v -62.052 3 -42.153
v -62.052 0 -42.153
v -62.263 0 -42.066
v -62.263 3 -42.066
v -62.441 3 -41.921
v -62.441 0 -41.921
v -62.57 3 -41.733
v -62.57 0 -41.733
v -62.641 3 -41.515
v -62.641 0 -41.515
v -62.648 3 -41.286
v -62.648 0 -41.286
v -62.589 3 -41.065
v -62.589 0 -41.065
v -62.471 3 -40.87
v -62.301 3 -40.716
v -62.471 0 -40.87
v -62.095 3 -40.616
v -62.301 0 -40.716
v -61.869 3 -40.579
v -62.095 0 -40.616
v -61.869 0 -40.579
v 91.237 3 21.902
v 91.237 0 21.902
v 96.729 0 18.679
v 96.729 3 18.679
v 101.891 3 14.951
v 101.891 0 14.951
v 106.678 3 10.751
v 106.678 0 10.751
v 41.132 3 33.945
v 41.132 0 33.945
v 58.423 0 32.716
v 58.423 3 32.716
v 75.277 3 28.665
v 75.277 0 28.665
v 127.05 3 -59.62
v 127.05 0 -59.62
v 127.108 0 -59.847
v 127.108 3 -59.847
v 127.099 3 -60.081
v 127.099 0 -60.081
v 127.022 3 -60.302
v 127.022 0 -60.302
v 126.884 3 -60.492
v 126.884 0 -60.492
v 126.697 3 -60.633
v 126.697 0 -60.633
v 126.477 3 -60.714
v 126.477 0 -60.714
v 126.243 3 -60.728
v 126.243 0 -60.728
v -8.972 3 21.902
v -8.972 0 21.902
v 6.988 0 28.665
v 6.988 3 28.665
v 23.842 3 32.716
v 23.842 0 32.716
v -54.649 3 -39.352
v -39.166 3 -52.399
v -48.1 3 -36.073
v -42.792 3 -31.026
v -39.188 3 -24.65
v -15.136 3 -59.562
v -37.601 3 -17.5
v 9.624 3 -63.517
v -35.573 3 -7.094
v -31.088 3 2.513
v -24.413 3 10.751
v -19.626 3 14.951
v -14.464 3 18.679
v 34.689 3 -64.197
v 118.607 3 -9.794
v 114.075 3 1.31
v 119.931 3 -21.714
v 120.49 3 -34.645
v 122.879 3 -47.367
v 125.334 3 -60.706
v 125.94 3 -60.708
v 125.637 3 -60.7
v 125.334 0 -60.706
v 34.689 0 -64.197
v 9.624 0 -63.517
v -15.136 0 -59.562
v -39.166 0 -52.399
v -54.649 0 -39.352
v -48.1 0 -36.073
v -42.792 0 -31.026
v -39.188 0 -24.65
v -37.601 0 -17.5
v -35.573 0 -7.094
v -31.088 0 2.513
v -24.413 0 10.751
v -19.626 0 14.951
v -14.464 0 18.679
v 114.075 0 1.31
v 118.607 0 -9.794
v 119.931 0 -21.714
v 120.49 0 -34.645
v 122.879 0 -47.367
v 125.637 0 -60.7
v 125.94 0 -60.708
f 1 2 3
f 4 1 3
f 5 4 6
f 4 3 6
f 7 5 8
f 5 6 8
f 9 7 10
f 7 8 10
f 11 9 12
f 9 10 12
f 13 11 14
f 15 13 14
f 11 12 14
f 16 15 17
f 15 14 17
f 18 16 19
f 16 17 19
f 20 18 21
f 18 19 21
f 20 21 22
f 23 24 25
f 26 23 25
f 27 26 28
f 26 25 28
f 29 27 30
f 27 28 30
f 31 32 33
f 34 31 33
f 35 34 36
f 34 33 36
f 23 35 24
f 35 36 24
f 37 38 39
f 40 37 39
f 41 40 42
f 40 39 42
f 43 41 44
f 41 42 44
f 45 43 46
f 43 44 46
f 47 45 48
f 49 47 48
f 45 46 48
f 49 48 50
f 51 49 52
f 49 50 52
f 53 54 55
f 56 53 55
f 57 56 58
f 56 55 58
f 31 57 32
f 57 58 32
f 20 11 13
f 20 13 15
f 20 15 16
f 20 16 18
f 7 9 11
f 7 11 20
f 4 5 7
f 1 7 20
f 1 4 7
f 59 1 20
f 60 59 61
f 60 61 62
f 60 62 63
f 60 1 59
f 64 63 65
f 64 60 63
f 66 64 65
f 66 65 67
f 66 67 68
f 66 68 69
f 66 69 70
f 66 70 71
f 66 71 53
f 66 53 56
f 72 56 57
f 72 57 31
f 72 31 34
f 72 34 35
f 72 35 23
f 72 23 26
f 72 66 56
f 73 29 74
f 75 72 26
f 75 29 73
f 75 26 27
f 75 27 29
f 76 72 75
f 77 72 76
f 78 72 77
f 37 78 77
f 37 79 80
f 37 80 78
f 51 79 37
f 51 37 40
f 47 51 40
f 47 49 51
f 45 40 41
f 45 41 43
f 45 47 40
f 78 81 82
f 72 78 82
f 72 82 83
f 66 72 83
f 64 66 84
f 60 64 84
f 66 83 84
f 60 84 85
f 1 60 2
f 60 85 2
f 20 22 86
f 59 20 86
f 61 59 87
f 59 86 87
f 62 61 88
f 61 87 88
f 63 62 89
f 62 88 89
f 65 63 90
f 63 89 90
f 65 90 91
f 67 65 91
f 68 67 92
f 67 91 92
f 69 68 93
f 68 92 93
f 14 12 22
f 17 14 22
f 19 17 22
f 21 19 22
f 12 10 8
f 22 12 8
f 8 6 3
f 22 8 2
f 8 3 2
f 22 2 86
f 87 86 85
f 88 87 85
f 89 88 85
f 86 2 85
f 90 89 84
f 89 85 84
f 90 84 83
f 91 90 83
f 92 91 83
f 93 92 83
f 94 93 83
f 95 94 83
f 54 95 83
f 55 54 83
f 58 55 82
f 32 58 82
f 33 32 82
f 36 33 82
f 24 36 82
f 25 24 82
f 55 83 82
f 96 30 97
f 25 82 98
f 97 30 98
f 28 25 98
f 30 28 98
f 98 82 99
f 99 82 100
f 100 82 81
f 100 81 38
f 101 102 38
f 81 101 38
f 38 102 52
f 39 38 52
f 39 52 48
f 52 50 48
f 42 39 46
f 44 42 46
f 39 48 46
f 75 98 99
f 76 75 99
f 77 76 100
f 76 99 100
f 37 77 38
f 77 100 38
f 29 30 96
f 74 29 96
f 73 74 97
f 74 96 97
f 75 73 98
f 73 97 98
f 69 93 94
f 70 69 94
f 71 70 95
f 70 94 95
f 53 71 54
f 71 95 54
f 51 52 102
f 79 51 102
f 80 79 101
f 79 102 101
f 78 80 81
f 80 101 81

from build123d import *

# Parameters (mm, degrees)
BOSS_EXTRUDE1_DEPTH = 3


with BuildPart() as part:
    # Sketch1 → Boss-Extrude1 (new body)
    with BuildSketch(Plane(origin=(0, 0, 0), x_dir=(1, 0, 0), z_dir=(0, 1, 0))):
        with BuildLine():
            Line((125.334448741, 60.70559707), (34.689006477, 64.197109776))
            ThreePointArc((34.689006477, 64.197109776), (-15.13644212, 59.561512619), (-62.05150383, 42.153437665))
            ThreePointArc((-62.05150383, 42.153437665), (-62.647956965, 41.28649391), (-61.869388221, 40.578554275))
            ThreePointArc((-61.869388221, 40.578554275), (-45.258927275, 33.746363612), (-37.601267241, 17.499933699))
            ThreePointArc((-37.601267241, 17.499933699), (-33.623817753, 2.15297615), (-24.412676642, -10.750670229))
            ThreePointArc((-24.412676642, -10.750670229), (-17.089531788, -16.87593356), (-8.972231882, -21.901542344))
            ThreePointArc((-8.972231882, -21.901542344), (15.331470951, -31.037864787), (41.132426556, -33.945277559))
            ThreePointArc((41.132426556, -33.945277559), (66.933382162, -31.037864787), (91.237084995, -21.901542344))
            ThreePointArc((91.237084995, -21.901542344), (99.354384901, -16.87593356), (106.677529755, -10.750670229))
            ThreePointArc((106.677529755, -10.750670229), (116.726166056, 4.084607563), (119.930653965, 21.713896145))
            ThreePointArc((119.930653965, 21.713896145), (121.458201516, 41.048643152), (127.049993776, 59.620064816))
            ThreePointArc((127.049993776, 59.620064816), (126.959504732, 60.402154552), (126.242784377, 60.727983579))
            ThreePointArc((126.242784377, 60.727983579), (125.788970047, 60.70244749), (125.334448741, 60.70559707))
        make_face()
    extrude(amount=BOSS_EXTRUDE1_DEPTH)


solid = part.part
